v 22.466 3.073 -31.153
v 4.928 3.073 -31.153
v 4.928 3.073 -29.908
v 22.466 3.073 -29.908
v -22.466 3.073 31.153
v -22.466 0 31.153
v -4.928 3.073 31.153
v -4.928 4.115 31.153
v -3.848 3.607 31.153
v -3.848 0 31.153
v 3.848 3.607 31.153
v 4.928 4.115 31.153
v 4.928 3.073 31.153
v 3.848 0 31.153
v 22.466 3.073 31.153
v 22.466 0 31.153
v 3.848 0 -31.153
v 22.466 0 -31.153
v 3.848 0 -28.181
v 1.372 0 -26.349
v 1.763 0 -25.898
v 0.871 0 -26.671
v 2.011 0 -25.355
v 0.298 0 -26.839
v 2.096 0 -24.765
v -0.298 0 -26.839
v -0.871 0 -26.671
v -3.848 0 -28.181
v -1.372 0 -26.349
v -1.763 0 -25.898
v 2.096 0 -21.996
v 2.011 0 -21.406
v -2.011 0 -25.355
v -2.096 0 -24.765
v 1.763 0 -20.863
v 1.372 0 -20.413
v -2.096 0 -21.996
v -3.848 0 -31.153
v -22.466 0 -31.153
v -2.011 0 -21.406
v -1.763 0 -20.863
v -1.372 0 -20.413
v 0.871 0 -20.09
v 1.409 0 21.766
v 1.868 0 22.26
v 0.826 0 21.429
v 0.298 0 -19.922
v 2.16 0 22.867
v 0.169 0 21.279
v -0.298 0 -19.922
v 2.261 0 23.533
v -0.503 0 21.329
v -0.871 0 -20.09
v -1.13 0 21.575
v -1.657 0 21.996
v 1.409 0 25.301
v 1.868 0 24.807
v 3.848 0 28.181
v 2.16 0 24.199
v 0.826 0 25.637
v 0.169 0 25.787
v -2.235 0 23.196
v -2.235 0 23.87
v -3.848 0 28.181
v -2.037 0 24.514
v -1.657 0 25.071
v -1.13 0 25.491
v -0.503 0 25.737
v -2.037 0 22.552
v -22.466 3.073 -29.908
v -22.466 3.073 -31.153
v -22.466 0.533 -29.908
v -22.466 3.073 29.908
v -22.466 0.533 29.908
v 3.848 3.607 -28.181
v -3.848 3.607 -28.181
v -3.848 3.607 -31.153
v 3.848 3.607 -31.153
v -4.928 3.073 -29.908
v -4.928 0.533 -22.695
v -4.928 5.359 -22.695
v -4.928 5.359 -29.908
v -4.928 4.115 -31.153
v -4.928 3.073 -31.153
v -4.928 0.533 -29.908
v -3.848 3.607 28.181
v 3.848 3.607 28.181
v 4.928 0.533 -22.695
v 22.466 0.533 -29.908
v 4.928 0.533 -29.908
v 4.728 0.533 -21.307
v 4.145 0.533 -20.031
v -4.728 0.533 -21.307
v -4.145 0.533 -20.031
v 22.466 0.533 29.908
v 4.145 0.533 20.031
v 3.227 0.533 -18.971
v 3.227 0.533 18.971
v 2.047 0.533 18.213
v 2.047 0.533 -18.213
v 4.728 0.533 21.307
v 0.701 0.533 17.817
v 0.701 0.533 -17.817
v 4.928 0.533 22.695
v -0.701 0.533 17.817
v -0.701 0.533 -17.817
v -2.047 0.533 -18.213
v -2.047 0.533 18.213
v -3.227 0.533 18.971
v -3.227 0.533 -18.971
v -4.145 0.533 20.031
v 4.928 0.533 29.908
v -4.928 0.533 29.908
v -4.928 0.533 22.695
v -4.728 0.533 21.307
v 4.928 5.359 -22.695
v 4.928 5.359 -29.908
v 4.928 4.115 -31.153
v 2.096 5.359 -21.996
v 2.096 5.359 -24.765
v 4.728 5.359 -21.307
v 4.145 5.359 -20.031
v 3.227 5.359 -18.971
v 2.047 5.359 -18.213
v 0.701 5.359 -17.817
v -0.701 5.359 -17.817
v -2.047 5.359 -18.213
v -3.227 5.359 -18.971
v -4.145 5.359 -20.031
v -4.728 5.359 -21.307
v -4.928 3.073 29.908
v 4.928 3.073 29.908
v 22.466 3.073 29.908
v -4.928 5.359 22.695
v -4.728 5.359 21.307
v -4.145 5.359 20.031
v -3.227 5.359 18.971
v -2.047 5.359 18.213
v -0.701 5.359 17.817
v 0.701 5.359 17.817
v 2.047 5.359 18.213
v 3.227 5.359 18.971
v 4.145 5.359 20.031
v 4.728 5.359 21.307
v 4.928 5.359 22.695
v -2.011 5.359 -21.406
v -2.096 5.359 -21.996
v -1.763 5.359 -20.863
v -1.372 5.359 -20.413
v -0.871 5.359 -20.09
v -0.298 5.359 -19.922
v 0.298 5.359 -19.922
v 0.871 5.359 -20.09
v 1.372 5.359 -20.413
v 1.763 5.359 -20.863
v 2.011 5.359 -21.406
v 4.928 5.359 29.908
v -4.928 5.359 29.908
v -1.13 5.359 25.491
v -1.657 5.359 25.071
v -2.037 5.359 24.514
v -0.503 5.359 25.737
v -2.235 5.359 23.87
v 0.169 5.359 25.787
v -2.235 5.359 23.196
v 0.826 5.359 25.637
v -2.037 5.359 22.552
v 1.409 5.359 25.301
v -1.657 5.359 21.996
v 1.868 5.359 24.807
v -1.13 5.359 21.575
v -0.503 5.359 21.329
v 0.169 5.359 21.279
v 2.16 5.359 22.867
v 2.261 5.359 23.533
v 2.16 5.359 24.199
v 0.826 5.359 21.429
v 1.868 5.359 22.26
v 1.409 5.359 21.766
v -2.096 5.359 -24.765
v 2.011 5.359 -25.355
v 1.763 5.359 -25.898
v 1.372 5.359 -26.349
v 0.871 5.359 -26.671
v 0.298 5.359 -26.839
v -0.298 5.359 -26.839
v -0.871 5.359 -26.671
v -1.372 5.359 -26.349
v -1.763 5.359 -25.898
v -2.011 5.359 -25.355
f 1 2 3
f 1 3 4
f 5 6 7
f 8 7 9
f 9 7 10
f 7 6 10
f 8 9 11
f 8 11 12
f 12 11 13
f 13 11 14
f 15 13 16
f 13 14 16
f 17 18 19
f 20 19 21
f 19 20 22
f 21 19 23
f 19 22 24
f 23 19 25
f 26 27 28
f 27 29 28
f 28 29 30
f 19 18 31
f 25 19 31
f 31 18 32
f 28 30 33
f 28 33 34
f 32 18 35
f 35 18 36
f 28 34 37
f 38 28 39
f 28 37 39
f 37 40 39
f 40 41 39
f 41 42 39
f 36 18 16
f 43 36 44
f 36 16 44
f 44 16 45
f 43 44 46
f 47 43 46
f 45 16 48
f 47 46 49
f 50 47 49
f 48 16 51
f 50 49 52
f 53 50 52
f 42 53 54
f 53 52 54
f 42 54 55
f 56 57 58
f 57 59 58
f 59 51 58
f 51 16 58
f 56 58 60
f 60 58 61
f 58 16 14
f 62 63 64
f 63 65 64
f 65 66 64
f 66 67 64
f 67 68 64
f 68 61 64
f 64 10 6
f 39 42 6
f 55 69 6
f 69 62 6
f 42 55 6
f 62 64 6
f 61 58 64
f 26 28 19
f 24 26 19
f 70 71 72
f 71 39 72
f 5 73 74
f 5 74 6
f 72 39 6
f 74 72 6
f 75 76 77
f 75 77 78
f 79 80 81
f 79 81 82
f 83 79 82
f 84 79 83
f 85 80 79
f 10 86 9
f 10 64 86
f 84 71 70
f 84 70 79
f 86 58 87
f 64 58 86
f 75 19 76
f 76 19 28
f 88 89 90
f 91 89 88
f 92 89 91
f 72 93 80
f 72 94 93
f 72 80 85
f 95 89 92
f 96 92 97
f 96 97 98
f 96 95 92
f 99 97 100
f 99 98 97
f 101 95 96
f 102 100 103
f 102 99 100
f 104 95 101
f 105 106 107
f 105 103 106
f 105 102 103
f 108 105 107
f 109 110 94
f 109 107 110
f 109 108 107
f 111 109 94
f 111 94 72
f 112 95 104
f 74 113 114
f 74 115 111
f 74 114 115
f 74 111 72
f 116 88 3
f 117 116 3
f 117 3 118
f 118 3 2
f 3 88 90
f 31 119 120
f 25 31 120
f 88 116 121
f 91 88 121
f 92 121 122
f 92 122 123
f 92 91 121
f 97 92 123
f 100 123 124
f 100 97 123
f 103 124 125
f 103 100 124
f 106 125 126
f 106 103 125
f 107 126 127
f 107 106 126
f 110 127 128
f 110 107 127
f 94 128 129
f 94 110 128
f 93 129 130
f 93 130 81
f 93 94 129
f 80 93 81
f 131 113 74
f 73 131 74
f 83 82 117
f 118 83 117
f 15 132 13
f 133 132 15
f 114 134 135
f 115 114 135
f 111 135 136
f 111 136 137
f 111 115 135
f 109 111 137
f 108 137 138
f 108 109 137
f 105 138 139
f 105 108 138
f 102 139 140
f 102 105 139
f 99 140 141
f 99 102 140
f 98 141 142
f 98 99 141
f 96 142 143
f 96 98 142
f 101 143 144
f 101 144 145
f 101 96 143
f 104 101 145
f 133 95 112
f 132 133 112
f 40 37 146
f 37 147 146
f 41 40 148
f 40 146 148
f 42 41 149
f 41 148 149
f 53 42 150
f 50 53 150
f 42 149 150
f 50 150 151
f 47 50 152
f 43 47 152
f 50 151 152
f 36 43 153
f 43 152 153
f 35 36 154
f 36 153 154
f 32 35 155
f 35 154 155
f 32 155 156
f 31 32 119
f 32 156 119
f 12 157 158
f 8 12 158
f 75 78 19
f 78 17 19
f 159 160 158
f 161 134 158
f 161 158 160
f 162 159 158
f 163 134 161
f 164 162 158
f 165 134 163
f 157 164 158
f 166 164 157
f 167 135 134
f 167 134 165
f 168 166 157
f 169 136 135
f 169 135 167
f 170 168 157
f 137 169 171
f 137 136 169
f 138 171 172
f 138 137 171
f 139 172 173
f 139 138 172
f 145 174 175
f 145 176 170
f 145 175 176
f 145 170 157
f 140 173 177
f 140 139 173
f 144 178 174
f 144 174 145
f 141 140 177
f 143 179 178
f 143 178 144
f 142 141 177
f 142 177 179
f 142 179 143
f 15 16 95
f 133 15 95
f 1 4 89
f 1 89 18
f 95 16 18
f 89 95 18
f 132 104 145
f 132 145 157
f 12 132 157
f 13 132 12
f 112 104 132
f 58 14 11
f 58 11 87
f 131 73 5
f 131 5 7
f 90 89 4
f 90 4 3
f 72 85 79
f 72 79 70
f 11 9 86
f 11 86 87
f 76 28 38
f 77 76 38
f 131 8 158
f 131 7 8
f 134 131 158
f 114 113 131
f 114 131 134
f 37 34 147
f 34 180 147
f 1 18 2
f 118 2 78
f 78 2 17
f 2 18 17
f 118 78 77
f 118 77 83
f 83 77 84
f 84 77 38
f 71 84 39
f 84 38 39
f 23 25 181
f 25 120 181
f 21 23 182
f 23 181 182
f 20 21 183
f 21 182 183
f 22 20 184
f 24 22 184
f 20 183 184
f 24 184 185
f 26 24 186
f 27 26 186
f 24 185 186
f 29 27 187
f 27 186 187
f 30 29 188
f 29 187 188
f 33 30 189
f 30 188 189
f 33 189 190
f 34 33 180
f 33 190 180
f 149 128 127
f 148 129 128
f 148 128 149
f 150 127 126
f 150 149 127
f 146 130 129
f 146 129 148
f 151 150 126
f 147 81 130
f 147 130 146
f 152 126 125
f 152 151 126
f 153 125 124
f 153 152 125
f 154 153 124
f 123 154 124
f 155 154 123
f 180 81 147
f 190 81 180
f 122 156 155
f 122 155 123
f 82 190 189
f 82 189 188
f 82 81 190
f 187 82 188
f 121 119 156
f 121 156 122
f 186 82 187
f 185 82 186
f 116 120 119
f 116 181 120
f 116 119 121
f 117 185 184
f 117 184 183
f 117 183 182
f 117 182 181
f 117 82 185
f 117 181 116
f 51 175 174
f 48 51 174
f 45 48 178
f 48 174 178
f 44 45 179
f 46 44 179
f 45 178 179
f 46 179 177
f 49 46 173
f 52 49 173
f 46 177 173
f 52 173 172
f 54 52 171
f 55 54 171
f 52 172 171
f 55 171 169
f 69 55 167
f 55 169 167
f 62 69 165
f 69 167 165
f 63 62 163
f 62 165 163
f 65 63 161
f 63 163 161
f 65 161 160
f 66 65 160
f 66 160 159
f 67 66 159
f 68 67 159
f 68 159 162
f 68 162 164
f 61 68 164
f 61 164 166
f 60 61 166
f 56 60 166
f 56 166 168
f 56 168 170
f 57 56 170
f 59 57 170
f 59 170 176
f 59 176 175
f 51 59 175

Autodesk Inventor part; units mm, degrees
ref_plane "YZ Plane" through (0, 0, 0) normal (1, 0, 0) x (0, 1, 0)
ref_plane "XZ Plane" through (0, 0, 0) normal (0, 1, 0) x (-1, 0, 0)
ref_plane "XY Plane" through (0, 0, 0) normal (0, 0, 1) x (1, 0, 0)
sketch "Sketch1" plane through (0, 0, 0) normal (0, 1, 0) x (-1, 0, 0)
  line L0 (22.4663, 31.1531) -> (-22.4663, 31.1531)
  line L1 (-22.4663, 31.1531) -> (-22.4663, -31.1531)
  line L2 (-22.4663, -31.1531) -> (22.4663, -31.1531)
  line L3 (22.4663, -31.1531) -> (22.4663, 31.1531)
  point P0 (0, 0)
  point P1 (22.4663, 0)
  point P2 (0, -31.1531)
  dimension "d0" = 62.3062
  dimension "d1" = 44.9326
extrude "Extrusion1" add sketch "Sketch1" along normal blind 0.5334
sketch "Sketch2" plane through (0, 0.5334, 0) normal (0, 1, 0) x (1, 0, 0)
  line L0 (22.4663, -31.1531) -> (22.4663, 31.1531) projected
  line L1 (-22.4663, 31.1531) -> (22.4663, 31.1531)
  line L2 (22.4663, 31.1531) -> (22.4663, 29.9085)
  line L3 (22.4663, 29.9085) -> (-22.4663, 29.9085)
  line L4 (-22.4663, 29.9085) -> (-22.4663, 31.1531)
  line L5 (-22.4663, -31.1531) -> (22.4663, -31.1531)
  line L6 (22.4663, -31.1531) -> (22.4663, -29.9085)
  line L7 (22.4663, -29.9085) -> (-22.4663, -29.9085)
  line L8 (-22.4663, -29.9085) -> (-22.4663, -31.1531)
  line L9 (-22.4663, -31.1531) -> (22.4663, -31.1531) projected
  point P0 (0, 0)
  dimension "d4" = 1.2446
  dimension "d5" = 1.2446
  dimension "d6" = 59.817
  dimension "d7" = 0
extrude "Extrusion2" add sketch "Sketch2" along normal blind 2.54
sketch "Sketch3" plane through (0, 0.5334, 0) normal (0, 1, 0) x (1, 0, 0)
  line L0 (22.4663, 29.9085) -> (-22.4663, 29.9085) projected
  line L1 (4.9276, 29.9085) -> (-4.9276, 29.9085)
  line L2 (-4.9276, 29.9085) -> (-4.9276, 22.6949)
  line L3 (0, 17.7673) -> (0, 17.7673)
  line L4 (4.9276, 22.6949) -> (4.9276, 29.9085)
  arc A0 (-4.9276, 22.6949) -> (0, 17.7673) centre (0, 22.6949) ccw
  arc A1 (0, 17.7673) -> (4.9276, 22.6949) centre (0, 22.6949) ccw
  line L5 (22.4663, -29.9085) -> (-22.4663, -29.9085) projected
  line L6 (4.9276, -29.9085) -> (-4.9276, -29.9085)
  line L7 (-4.9276, -29.9085) -> (-4.9276, -22.6949)
  line L8 (0, -17.7673) -> (0, -17.7673)
  line L9 (4.9276, -22.6949) -> (4.9276, -29.9085)
  arc A2 (4.9276, -22.6949) -> (0, -17.7673) centre (0, -22.6949) ccw
  arc A3 (0, -17.7673) -> (-4.9276, -22.6949) centre (0, -22.6949) ccw
  point P0 (0, 0)
  point P1 (-4.9276, 17.7673)
  point P2 (4.9276, 17.7673)
  point P3 (0, 17.7673)
  point P4 (-4.9276, -17.7673)
  point P5 (4.9276, -17.7673)
  dimension "d10" = 12.1412
  dimension "d11" = 9.8552
  dimension "d12" = 4.9276
  dimension "d13" = 9.8552
  dimension "d14" = 12.1412
  dimension "d15" = 4.9276
  dimension "d16" = 4.9276
extrude "Extrusion3" add sketch "Sketch3" along normal blind 4.826
sketch "Sketch4" plane through (0, 3.0734, 0) normal (0, 1, 0) x (1, 0, 0)
  line L0 (-22.4663, -31.1531) -> (22.4663, -31.1531) projected
  line L1 (4.9276, -29.9085) -> (-4.9276, -29.9085)
  line L2 (-4.9276, -29.9085) -> (-4.9276, -31.1531)
  line L3 (-4.9276, -31.1531) -> (4.9276, -31.1531)
  line L4 (4.9276, -31.1531) -> (4.9276, -29.9085)
  line L5 (22.4663, 31.1531) -> (-22.4663, 31.1531) projected
  line L6 (4.9276, 29.9085) -> (-4.9276, 29.9085)
  line L7 (-4.9276, 29.9085) -> (-4.9276, 31.1531)
  line L8 (-4.9276, 31.1531) -> (4.9276, 31.1531)
  line L9 (4.9276, 31.1531) -> (4.9276, 29.9085)
  point P0 (0, 0)
extrude "Extrusion4" add sketch "Sketch4" along normal blind 2.286
chamfer "Chamfer1" distance 1.2446 angle 45 2 edges at (0, 5.3594, 31.1531) (0, 5.3594, -31.1531)
sketch "Sketch5" plane through (0, 0, 0) normal (0, -1, 0) x (1, 0, 0)
  line L0 (22.4663, -31.1531) -> (-22.4663, -31.1531) projected
  line L1 (-3.8481, -31.1531) -> (3.8481, -31.1531)
  line L2 (3.8481, -31.1531) -> (3.8481, -28.1813)
  line L3 (3.8481, -28.1813) -> (-3.8481, -28.1813)
  line L4 (-3.8481, -28.1813) -> (-3.8481, -31.1531)
  line L5 (-22.4663, 31.1531) -> (22.4663, 31.1531) projected
  line L6 (-3.8481, 31.1531) -> (3.8481, 31.1531)
  line L7 (3.8481, 31.1531) -> (3.8481, 28.1813)
  line L8 (3.8481, 28.1813) -> (-3.8481, 28.1813)
  line L9 (-3.8481, 28.1813) -> (-3.8481, 31.1531)
  point P0 (0, 0)
  point P1 (0, -31.1531)
  point P2 (0, -28.1813)
  point P3 (0, 28.1813)
  point P4 (0, 31.1531)
  dimension "d24" = 7.6962
  dimension "d25" = 2.9718
  dimension "d26" = 2.9718
extrude "Extrusion5" cut sketch "Sketch5" against normal blind 3.6068
sketch "Sketch6" plane through (0, 5.3594, 0) normal (0, 1, 0) x (1, 0, 0)
  line L0 (0, 19.9009) -> (0, 19.9009)
  line L1 (2.0955, 21.9964) -> (2.0955, 24.765)
  line L2 (0, 26.8605) -> (0, 26.8605)
  line L3 (-2.0955, 24.765) -> (-2.0955, 21.9964)
  line L4 (4.9276, 31.1531) -> (-4.9276, 31.1531) projected
  arc A0 (0, 19.9009) -> (2.0955, 21.9964) centre (0, 21.9964) ccw
  arc A1 (-2.0955, 21.9964) -> (0, 19.9009) centre (0, 21.9964) ccw
  arc A2 (0, 26.8605) -> (-2.0955, 24.765) centre (0, 24.765) ccw
  arc A3 (2.0955, 24.765) -> (0, 26.8605) centre (0, 24.765) ccw
  circle A4 centre (0, -23.5331) radius 2.2606
  line L5 (-4.9276, -31.1531) -> (4.9276, -31.1531) projected
  point P0 (0, 0)
  point P1 (2.0955, 26.8605)
  point P2 (2.0955, 19.9009)
  point P3 (-2.0955, 26.8605)
  point P4 (0, 19.9009)
  dimension "d29" = 4.191
  dimension "d30" = 6.9596
  dimension "d31" = 4.2926
  dimension "d32" = 2.0955
  dimension "d33" = 2.0955
  dimension "d34" = 2.0955
  dimension "d35" = 7.62
  dimension "d38" = 4.5212
extrude "Extrusion6" cut sketch "Sketch6" against normal through all
properties part number "SSR-40 DA BOTTOM" material "Nickel-Copper Alloy 400"
